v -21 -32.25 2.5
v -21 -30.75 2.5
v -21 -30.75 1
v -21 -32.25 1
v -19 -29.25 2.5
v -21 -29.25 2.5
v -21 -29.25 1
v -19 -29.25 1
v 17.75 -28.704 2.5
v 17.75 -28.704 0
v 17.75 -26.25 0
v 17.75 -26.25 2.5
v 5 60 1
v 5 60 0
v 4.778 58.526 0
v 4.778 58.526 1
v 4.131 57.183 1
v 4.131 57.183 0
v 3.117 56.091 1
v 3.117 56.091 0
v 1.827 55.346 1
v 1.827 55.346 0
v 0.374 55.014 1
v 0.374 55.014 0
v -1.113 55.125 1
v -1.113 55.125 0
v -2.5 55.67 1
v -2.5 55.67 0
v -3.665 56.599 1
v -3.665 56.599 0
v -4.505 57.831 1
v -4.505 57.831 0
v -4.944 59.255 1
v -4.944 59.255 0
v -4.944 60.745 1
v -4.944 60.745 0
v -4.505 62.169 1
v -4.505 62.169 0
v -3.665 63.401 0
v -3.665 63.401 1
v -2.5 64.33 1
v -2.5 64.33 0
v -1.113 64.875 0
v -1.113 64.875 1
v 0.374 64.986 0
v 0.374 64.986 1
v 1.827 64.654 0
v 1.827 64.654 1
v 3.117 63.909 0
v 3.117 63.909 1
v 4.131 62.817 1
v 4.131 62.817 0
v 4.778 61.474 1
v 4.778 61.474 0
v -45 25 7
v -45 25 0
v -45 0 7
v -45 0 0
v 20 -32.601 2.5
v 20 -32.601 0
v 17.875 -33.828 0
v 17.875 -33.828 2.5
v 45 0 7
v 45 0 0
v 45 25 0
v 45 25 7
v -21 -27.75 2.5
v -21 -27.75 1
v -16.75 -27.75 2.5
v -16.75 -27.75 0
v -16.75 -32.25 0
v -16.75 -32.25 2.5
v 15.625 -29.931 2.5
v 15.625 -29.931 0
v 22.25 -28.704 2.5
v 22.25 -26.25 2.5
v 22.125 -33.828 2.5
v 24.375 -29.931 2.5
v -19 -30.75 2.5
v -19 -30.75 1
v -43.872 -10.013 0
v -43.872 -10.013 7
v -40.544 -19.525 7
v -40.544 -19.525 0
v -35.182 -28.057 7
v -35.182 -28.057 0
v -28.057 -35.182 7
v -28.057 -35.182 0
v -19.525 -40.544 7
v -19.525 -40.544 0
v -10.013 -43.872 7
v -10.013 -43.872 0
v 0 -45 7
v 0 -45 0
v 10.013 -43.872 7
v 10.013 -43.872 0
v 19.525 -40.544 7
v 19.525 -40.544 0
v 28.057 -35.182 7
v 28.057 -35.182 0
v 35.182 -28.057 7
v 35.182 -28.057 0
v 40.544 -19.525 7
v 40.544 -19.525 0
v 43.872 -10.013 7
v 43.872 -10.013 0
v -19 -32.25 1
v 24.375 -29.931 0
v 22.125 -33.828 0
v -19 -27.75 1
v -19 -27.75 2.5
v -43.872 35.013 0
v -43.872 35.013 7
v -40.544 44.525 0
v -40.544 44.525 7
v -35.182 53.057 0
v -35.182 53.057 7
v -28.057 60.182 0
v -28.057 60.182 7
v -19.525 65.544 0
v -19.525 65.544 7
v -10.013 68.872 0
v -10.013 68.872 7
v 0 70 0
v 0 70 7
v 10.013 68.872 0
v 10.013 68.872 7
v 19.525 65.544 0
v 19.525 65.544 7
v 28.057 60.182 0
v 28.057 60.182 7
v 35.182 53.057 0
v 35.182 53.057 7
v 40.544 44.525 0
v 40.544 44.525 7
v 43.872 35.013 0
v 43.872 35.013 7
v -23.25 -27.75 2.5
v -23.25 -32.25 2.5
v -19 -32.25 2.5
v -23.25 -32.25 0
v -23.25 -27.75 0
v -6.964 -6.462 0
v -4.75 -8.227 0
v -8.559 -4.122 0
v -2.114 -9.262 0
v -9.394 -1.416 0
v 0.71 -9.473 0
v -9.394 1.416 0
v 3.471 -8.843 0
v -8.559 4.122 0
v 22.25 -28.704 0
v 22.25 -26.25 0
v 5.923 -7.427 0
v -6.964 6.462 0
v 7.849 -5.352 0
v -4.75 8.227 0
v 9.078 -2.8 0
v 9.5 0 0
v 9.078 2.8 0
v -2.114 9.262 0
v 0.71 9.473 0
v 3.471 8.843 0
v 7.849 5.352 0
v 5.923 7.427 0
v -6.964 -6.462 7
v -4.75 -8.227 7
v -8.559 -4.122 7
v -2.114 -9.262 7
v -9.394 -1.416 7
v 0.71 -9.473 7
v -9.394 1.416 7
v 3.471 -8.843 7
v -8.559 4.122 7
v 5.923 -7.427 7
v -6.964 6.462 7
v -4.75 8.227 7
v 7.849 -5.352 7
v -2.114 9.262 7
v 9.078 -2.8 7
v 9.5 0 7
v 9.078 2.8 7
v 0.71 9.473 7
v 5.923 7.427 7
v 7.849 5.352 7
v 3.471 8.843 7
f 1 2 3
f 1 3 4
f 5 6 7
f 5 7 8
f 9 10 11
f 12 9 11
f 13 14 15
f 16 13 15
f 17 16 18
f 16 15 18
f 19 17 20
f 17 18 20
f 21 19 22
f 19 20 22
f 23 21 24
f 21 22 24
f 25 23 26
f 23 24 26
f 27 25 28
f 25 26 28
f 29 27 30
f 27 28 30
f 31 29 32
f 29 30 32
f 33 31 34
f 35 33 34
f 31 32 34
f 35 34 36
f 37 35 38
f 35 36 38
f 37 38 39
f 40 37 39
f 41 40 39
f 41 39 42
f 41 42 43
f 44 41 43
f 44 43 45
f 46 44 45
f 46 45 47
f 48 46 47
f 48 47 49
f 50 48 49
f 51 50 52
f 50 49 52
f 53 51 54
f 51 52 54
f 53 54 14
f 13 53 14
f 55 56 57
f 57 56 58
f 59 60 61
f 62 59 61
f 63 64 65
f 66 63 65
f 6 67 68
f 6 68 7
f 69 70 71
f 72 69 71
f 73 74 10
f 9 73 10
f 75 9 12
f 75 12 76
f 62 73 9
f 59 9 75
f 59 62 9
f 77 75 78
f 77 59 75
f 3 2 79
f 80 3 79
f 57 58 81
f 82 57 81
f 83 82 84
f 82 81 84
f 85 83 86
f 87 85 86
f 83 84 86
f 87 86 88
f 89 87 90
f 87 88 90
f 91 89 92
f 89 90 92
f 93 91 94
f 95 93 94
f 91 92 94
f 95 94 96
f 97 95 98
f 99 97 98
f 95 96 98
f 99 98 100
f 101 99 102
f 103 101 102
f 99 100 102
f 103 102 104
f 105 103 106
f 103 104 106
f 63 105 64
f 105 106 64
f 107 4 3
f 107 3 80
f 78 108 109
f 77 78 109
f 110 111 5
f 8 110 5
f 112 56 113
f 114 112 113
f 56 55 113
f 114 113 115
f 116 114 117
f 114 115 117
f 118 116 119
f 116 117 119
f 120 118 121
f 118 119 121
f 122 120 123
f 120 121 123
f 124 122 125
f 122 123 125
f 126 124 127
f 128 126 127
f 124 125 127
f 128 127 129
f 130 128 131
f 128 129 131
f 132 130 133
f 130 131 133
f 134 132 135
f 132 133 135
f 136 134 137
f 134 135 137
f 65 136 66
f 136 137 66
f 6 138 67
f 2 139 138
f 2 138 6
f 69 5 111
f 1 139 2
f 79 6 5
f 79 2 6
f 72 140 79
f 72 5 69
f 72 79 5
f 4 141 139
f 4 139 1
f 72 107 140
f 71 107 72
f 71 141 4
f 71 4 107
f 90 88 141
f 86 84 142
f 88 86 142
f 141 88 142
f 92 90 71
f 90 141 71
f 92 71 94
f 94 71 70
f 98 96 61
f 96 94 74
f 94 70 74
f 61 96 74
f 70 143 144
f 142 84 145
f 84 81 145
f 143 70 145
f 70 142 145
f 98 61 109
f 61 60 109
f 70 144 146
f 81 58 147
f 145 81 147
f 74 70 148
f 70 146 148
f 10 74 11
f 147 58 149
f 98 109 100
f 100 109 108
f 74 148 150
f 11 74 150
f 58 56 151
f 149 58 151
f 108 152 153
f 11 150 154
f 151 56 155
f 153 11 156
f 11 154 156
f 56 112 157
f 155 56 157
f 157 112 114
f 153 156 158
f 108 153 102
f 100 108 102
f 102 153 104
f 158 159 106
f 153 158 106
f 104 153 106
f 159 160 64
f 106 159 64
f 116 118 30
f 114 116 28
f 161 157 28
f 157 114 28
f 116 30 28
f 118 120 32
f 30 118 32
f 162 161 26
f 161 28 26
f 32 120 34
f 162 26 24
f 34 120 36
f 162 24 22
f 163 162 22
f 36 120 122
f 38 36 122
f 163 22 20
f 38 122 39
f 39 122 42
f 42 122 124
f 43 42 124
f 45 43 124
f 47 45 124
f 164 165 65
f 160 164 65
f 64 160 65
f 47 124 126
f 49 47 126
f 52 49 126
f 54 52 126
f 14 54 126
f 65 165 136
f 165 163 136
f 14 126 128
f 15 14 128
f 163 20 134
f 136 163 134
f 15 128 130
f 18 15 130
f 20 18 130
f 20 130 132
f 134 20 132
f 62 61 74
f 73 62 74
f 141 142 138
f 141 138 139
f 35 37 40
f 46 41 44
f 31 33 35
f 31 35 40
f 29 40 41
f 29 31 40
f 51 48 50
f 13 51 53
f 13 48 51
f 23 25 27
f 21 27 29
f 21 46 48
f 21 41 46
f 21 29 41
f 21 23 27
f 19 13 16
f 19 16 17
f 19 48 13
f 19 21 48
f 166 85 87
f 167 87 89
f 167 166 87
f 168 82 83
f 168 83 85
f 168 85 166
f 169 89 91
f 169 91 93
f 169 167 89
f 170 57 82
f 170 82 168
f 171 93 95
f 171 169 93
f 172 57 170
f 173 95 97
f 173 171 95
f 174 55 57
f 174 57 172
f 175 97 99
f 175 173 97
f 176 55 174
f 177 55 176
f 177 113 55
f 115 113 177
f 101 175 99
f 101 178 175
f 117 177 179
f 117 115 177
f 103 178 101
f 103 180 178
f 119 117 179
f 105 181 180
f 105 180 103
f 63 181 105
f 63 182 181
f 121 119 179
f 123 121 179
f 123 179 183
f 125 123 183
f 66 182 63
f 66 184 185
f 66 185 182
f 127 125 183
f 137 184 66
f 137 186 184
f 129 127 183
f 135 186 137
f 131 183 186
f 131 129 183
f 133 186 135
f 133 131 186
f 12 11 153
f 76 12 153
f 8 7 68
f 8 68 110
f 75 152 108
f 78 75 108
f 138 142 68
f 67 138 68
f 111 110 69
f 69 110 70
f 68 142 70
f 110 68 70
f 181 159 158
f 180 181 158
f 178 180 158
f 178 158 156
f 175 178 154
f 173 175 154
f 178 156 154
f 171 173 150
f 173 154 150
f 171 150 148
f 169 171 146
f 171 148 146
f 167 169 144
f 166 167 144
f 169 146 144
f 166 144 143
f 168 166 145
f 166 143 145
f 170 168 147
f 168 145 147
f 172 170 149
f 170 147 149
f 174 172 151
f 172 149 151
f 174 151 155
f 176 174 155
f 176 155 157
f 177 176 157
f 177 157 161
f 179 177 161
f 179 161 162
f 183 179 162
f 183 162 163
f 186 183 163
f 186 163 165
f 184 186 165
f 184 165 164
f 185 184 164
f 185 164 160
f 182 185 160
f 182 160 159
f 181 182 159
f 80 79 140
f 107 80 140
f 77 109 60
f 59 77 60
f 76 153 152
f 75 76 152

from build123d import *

# Parameters (mm, degrees)
F1_DEPTH  = 7
F2_R      = 9.5
F3_DEPTH  = 10
F6_DEPTH  = 2.5
F4_R      = 5
F7_DEPTH  = 1
F8_W      = 6.5
F8_H      = 4.5
F9_DEPTH  = 2.5
F10_W     = 2
F10_H     = 1.5
F11_DEPTH = 1.5
F12_R     = 44.99999


# Not quite as in the source:
# - a fillet or chamfer is up to 0.001 mm smaller than in the source, because OpenCascade refuses the exact size


with BuildPart() as f1:
    # F0 (on Top) → F1 (new body)
    with BuildSketch(Plane.XY):
        with BuildLine():
            Line((-45, 70), (-45, 0))
            ThreePointArc((-45, 0), (0, -45), (45, 0))
            Line((45, 0), (45, 70))
            Line((45, 70), (-45, 70))
        make_face()
    extrude(amount=F1_DEPTH)

    # F2 (on face) → F3 (cut)
    with BuildSketch(Plane(origin=(0, 0, 0), x_dir=(1, 0, 0), z_dir=(0, 0, -1))):
        Circle(F2_R)
    extrude(amount=-F3_DEPTH, mode=Mode.SUBTRACT)

    # F5 (on face) → F6 (cut)
    with BuildSketch(Plane(origin=(0, 0, 0), x_dir=(1, 0, 0), z_dir=(0, 0, -1))):
        Polygon((20, 32.6008529611), (17.875, 33.8277222831), (15.625, 29.9306079661), (17.75, 28.7037386441), (17.75, 26.25), (22.25, 26.25), (22.25, 28.7037386441), (24.375, 29.9306079661), (22.125, 33.8277222831), align=None)
    extrude(amount=-F6_DEPTH, mode=Mode.SUBTRACT)

    # F4 (on face) → F7 (cut)
    with BuildSketch(Plane(origin=(0, 0, 0), x_dir=(1, 0, 0), z_dir=(0, 0, -1))):
        with Locations((0, -60)):
            Circle(F4_R)
    extrude(amount=-F7_DEPTH, mode=Mode.SUBTRACT)

    # F8 (on face) → F9 (cut)
    with BuildSketch(Plane(origin=(0, 0, 0), x_dir=(1, 0, 0), z_dir=(0, 0, -1))):
        with Locations((-20, 30)):
            Rectangle(F8_W, F8_H)
    extrude(amount=-F9_DEPTH, mode=Mode.SUBTRACT)

    # F10 (on face) → F11 (join)
    with BuildSketch(Plane(origin=(0, 0, 2.5), x_dir=(1, 0, 0), z_dir=(0, 0, -1))):
        with Locations((-20, 31.5)):
            Rectangle(F10_W, F10_H)
        with Locations((-20, 28.5)):
            Rectangle(F10_W, F10_H)
    extrude(amount=F11_DEPTH)

    # F12 (radius 45 in the source; OpenCascade refuses exactly that, so slightly less here)
    f12_edges = [f1.edges().sort_by_distance(p)[0] for p in [
        (-45, 70, 3.5),
        (45, 70, 3.5),
    ]]
    fillet(f12_edges, radius=F12_R)


solid = f1.part
